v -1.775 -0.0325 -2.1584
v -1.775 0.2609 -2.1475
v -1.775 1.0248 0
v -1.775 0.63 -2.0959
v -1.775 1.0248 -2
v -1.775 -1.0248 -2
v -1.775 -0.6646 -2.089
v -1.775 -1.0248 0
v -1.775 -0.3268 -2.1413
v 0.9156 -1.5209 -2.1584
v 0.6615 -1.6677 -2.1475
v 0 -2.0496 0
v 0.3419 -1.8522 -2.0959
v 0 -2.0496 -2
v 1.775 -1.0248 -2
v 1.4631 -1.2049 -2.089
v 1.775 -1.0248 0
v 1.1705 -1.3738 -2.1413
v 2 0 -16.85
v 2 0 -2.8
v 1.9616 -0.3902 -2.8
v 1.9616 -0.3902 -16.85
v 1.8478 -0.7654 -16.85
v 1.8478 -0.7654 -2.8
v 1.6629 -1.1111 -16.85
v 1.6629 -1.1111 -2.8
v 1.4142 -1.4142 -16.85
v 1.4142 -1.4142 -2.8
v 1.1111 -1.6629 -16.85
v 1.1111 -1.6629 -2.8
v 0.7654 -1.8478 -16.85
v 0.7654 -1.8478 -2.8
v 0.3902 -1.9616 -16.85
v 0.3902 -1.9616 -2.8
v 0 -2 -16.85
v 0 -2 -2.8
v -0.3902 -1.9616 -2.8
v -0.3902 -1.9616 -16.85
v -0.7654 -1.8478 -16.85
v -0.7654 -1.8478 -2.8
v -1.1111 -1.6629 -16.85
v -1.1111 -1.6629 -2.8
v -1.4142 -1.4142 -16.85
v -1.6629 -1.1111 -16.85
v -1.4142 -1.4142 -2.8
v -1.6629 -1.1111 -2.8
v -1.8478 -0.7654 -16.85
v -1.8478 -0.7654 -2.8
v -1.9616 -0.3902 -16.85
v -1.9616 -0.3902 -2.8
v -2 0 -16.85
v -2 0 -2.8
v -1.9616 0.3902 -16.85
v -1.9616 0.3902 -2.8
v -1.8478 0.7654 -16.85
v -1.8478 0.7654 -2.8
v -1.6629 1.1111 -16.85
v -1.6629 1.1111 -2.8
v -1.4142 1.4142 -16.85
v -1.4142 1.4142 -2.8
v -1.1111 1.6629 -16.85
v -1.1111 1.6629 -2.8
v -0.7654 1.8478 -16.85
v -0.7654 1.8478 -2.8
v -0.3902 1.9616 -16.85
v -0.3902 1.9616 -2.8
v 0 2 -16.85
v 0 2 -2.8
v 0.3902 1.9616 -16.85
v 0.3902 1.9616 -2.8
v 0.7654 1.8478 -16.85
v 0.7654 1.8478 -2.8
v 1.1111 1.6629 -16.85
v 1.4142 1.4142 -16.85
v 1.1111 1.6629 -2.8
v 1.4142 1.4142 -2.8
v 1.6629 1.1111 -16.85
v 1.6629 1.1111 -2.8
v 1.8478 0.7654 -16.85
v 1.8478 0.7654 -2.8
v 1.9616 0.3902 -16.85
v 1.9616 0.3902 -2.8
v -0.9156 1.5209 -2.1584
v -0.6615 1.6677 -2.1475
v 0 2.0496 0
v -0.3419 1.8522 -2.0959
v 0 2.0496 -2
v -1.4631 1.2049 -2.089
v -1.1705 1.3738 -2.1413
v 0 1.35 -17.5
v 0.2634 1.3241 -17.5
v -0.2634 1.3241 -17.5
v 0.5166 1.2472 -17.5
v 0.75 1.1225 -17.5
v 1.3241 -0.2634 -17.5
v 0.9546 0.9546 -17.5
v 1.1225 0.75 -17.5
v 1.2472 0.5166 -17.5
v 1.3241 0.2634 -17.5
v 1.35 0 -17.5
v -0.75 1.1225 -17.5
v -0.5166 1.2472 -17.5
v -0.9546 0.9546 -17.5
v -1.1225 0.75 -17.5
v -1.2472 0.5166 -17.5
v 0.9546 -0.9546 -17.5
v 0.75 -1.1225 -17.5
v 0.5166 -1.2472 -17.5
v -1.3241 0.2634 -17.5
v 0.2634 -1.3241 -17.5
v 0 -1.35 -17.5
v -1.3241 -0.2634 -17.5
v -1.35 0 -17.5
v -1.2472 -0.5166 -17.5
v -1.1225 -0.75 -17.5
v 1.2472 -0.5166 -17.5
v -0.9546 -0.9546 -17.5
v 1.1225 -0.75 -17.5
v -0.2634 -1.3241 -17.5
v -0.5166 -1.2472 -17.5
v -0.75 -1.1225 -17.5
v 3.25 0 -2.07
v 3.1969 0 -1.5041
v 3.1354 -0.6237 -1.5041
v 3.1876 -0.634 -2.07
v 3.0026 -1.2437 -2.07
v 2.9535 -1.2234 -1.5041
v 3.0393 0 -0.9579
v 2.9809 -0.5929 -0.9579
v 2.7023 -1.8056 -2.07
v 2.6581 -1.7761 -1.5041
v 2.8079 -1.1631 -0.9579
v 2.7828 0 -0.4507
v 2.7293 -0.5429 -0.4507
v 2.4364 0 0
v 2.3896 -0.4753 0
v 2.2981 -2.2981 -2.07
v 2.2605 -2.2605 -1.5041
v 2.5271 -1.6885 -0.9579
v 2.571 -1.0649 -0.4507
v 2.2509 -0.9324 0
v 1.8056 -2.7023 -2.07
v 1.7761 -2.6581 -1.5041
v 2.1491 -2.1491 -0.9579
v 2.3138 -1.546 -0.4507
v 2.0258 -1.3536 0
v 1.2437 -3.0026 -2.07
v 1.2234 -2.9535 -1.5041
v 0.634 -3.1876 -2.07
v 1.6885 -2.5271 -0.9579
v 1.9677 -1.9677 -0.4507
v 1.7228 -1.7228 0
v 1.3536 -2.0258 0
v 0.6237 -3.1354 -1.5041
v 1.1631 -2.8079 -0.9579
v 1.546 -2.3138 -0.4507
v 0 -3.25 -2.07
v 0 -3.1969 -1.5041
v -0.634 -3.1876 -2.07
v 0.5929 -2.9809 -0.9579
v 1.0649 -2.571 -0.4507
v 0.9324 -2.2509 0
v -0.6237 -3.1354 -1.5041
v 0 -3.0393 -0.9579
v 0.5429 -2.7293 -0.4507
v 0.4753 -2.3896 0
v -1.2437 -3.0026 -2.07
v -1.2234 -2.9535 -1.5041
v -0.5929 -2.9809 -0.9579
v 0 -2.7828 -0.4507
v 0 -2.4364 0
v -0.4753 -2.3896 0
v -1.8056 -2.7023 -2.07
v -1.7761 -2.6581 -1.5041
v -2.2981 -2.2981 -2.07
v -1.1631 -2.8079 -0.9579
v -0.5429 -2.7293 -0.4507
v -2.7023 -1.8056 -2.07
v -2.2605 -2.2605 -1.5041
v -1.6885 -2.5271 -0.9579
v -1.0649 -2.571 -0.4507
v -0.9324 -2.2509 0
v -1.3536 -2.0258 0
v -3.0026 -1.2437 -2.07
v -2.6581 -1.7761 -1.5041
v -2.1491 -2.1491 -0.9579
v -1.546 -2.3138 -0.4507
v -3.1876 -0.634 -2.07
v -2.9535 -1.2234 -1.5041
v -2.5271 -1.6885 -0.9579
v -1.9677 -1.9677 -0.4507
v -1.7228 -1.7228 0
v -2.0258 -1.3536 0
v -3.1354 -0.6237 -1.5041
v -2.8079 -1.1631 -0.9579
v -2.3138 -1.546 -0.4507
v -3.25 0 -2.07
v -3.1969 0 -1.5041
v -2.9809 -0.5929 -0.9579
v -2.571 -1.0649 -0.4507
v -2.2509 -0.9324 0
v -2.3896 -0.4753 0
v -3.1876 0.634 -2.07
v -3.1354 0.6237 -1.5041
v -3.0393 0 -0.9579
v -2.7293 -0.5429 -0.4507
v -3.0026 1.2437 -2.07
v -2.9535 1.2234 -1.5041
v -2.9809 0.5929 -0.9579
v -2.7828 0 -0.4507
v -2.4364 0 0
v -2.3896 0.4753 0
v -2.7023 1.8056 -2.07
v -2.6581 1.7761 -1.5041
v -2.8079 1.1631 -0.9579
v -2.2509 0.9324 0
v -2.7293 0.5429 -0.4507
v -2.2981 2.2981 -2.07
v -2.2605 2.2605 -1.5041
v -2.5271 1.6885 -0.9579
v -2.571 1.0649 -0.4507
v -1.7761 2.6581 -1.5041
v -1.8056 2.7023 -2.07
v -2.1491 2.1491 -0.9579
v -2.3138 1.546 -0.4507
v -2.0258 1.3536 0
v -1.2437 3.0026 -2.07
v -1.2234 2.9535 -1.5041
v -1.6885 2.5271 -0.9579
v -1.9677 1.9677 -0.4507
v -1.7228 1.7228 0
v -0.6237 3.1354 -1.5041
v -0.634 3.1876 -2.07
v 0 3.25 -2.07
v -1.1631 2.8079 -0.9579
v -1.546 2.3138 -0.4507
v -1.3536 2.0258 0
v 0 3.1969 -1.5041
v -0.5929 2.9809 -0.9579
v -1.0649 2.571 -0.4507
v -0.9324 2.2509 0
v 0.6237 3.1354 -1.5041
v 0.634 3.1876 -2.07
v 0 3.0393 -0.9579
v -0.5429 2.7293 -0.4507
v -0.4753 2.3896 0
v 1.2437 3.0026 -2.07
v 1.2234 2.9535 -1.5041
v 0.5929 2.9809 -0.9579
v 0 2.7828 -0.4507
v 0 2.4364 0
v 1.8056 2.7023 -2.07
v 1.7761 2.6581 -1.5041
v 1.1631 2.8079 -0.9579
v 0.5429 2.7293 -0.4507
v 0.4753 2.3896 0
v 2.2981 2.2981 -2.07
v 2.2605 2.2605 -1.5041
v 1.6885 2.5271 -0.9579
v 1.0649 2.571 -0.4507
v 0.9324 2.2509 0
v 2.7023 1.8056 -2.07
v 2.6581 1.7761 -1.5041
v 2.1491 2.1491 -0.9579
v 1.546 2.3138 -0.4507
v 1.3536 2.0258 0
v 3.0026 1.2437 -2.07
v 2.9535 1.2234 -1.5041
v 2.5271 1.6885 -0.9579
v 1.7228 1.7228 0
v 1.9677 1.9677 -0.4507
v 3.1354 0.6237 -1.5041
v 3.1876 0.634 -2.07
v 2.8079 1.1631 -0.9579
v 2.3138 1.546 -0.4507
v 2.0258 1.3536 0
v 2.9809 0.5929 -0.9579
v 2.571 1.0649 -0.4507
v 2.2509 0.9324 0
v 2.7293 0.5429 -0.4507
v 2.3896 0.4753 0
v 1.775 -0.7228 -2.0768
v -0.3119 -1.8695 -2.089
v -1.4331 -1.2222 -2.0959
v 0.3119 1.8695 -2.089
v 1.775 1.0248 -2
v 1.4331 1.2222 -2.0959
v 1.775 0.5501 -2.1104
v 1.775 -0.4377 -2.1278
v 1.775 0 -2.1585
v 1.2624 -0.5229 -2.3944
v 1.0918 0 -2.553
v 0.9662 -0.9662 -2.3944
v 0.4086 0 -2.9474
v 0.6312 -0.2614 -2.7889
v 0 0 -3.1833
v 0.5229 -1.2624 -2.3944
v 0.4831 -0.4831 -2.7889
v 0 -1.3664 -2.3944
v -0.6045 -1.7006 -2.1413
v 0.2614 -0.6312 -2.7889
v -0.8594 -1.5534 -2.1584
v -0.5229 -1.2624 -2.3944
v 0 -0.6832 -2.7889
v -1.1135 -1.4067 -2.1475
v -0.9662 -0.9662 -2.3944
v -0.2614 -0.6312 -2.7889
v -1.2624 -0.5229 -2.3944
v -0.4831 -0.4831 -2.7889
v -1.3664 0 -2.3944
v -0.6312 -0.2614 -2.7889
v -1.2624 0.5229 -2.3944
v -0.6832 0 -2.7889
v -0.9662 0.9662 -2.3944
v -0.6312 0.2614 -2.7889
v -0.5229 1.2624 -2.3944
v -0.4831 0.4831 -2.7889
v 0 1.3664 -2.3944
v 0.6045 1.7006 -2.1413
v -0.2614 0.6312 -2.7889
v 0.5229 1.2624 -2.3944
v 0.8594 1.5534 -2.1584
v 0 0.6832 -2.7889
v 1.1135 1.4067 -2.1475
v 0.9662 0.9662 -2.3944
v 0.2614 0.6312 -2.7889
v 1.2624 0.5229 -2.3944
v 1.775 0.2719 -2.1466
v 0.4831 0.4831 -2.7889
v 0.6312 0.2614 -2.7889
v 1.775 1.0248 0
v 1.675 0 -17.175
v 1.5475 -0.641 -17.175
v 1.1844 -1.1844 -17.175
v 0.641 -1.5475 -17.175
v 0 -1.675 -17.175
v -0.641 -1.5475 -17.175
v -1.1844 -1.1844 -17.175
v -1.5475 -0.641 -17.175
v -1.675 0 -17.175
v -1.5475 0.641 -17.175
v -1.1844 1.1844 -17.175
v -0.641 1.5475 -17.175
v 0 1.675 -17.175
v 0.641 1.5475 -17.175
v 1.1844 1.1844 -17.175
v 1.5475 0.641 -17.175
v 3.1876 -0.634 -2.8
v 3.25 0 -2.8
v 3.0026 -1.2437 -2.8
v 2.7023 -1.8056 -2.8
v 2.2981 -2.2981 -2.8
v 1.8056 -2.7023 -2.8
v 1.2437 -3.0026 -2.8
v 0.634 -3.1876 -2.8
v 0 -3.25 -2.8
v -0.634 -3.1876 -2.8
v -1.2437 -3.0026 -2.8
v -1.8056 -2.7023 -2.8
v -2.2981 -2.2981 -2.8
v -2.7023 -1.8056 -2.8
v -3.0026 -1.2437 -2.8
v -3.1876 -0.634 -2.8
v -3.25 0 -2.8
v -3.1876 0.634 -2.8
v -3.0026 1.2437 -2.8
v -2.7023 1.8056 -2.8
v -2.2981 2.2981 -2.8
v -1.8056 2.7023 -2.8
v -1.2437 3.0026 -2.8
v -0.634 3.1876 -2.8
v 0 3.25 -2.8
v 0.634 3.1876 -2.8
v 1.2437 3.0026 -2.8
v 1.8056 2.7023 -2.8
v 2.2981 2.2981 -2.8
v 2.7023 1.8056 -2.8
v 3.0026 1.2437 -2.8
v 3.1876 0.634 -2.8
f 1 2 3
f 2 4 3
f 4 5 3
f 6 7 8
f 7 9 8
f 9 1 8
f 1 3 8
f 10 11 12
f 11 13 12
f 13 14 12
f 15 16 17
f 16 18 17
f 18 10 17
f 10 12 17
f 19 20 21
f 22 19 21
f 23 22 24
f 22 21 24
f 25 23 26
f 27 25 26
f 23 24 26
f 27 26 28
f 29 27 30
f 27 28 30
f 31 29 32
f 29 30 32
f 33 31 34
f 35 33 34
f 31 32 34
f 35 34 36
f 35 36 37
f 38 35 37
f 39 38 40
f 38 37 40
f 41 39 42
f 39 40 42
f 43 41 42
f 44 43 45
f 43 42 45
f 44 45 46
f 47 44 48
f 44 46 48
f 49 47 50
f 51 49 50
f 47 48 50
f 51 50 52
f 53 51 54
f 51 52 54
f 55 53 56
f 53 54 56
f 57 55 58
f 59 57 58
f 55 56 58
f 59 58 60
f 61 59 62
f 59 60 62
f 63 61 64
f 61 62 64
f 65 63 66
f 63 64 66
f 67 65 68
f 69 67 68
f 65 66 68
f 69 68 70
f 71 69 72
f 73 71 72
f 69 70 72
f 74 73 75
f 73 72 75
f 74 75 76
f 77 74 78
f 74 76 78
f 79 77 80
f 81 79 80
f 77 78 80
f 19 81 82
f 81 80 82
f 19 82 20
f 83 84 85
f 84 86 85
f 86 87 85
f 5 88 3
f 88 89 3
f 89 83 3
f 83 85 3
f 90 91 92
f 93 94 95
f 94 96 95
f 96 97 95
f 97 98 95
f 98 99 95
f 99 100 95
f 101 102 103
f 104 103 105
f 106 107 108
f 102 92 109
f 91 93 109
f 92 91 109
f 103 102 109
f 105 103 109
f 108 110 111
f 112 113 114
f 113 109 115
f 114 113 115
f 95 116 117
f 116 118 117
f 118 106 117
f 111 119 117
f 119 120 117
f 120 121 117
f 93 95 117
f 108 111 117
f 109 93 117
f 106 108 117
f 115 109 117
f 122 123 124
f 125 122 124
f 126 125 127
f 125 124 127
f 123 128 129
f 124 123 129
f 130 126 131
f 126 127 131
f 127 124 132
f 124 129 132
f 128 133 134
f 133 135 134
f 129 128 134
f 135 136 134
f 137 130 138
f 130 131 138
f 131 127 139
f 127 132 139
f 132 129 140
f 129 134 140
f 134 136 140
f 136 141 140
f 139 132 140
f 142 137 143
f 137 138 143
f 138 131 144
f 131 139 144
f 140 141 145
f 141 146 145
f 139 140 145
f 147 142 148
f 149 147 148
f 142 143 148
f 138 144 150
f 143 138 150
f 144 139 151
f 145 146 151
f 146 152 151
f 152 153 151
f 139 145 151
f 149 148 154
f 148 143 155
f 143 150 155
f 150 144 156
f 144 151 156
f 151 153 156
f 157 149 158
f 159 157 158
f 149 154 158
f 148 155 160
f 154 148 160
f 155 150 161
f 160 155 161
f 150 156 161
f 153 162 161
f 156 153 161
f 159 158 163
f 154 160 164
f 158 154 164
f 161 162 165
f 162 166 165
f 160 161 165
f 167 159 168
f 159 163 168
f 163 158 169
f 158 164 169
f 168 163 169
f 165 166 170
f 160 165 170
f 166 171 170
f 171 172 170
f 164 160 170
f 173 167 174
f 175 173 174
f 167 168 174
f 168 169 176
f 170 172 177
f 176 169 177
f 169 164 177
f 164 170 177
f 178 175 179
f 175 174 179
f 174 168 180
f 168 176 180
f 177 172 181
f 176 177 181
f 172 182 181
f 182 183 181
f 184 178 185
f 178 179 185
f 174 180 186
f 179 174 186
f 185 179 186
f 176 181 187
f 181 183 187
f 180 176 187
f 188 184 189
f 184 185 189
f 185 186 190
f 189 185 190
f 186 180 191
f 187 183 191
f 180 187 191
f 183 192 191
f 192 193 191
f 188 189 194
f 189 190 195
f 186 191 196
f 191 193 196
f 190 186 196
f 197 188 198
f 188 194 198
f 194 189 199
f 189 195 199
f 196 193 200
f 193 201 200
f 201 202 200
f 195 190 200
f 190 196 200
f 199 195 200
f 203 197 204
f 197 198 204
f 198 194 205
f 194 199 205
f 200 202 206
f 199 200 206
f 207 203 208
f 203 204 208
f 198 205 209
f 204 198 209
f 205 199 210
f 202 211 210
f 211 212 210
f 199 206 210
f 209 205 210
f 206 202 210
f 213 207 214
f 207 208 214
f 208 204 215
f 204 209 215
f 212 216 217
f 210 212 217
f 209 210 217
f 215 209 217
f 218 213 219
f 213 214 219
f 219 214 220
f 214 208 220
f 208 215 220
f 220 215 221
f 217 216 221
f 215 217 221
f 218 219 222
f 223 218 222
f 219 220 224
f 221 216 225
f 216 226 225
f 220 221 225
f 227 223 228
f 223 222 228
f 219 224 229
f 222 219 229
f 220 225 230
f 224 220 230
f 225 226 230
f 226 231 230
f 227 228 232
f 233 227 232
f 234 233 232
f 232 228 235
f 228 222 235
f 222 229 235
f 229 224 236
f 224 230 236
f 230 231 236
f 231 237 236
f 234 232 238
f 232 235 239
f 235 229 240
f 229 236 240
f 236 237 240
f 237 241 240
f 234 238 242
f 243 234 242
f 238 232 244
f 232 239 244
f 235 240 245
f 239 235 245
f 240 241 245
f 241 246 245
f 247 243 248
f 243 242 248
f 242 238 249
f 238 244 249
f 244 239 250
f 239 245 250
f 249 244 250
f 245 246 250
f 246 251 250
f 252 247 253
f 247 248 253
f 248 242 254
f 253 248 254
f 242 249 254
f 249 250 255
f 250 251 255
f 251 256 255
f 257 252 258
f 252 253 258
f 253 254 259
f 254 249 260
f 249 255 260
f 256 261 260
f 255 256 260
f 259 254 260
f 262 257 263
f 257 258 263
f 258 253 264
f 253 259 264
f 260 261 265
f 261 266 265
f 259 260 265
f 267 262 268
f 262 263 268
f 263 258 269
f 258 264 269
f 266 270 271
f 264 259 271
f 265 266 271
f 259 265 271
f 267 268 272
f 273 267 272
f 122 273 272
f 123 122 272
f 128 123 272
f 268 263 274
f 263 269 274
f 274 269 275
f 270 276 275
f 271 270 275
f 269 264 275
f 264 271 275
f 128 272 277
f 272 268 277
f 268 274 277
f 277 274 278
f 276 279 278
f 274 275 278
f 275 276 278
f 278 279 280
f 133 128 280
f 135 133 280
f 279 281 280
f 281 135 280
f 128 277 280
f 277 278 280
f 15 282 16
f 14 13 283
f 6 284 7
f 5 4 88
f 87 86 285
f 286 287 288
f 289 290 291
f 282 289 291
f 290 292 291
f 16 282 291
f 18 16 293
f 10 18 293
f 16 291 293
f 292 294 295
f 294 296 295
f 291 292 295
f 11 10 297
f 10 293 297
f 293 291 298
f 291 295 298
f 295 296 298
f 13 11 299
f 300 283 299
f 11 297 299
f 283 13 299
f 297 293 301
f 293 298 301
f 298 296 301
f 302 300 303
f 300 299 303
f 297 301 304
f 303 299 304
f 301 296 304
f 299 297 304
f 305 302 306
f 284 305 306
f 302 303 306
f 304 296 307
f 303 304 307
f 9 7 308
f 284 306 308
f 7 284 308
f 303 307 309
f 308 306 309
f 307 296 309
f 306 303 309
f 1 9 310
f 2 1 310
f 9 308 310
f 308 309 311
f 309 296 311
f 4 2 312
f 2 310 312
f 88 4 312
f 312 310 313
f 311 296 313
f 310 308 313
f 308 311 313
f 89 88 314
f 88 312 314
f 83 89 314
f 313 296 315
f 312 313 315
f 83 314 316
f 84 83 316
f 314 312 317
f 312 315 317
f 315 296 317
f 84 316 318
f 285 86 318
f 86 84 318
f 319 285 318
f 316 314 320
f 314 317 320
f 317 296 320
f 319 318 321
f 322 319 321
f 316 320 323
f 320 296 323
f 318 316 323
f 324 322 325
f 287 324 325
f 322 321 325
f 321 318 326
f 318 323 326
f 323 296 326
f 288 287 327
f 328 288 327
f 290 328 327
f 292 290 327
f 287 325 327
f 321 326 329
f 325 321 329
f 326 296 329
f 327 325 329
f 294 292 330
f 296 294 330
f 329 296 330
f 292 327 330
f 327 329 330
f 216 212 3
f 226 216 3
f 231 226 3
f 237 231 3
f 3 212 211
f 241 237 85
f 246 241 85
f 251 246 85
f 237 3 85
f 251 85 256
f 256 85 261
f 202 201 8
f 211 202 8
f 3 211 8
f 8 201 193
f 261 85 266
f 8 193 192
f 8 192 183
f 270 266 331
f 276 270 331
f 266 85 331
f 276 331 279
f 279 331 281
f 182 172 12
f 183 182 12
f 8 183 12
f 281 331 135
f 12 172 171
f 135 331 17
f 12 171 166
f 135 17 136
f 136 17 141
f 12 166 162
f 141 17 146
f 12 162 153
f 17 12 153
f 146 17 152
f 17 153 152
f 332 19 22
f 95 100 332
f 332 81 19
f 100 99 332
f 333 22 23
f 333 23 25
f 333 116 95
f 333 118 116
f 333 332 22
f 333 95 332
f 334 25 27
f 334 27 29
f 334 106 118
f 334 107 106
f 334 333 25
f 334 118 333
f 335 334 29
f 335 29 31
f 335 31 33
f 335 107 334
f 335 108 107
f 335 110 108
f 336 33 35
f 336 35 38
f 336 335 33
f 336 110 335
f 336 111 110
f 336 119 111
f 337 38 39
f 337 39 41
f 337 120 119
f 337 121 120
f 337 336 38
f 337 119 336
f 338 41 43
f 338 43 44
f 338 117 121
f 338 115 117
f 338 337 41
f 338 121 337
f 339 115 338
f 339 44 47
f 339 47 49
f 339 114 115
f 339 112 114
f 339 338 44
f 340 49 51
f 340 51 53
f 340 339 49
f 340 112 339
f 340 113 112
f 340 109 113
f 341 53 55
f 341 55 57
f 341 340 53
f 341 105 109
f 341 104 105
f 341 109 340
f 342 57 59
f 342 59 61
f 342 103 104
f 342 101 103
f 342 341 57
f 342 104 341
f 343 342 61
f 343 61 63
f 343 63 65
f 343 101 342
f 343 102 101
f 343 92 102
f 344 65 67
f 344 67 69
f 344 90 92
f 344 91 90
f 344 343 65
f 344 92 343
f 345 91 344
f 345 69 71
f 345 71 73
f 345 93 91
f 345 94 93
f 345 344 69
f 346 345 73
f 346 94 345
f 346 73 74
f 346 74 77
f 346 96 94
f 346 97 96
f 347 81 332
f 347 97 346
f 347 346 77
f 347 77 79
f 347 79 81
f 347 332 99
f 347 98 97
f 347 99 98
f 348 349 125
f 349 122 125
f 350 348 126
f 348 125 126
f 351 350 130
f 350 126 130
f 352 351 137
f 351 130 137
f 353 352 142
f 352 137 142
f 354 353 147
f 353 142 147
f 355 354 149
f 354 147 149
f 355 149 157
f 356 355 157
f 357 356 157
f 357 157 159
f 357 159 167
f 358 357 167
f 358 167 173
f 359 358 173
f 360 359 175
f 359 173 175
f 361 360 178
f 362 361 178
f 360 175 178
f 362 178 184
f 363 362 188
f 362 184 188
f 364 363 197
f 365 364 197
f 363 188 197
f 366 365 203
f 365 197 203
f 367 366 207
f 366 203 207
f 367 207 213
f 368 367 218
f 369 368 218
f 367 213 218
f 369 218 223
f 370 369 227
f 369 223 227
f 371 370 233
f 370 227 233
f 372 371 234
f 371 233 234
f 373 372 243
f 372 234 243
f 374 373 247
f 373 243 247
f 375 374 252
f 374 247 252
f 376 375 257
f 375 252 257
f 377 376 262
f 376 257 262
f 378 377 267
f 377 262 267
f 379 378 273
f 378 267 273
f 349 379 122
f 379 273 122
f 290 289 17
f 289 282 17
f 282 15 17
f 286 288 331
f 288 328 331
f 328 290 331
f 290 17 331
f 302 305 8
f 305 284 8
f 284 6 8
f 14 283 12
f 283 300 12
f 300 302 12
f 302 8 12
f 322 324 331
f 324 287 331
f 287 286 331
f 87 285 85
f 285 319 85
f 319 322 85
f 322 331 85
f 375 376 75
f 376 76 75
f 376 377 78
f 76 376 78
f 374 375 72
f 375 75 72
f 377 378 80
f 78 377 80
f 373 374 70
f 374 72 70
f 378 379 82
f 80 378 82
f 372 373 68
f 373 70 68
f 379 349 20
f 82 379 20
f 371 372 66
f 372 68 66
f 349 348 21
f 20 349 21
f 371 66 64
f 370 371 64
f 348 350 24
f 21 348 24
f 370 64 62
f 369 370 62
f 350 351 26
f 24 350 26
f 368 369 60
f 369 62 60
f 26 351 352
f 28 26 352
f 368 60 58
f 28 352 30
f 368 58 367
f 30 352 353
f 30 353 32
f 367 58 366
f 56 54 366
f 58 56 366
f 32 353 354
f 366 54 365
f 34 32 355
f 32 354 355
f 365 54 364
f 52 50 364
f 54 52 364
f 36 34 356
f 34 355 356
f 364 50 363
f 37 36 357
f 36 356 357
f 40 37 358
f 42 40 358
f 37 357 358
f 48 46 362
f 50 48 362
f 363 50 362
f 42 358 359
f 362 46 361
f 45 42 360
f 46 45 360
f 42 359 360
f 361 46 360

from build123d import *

# Parameters (mm, degrees)
CHANFREIN2_SIZE    = 0.65
BOSS_EXTRU_1_REACH = 20.094
ESQUISSE3_R        = 2.43636475


with BuildPart() as part:
    # Esquisse1 → Révolution1 (revolve)
    with BuildSketch(Plane(origin=(0, 0, 0), x_dir=(0, 0, -1), z_dir=(1, 0, 0)), mode=Mode.PRIVATE) as r_volution1_sk:
        with BuildLine():
            Line((17.5, 2), (2.8, 2))
            Line((2.8, 2), (2.8, 3.25))
            Line((2.8, 3.25), (2.07, 3.25))
            ThreePointArc((2.07, 3.25), (0.957918357, 3.039288677), (0, 2.43636475))
            Line((0, 2.43636475), (0, 0))
            Line((0, 0), (17.5, 0))
            Line((17.5, 0), (17.5, 2))
        make_face()
    revolve(r_volution1_sk.sketch.rotate(Axis((0, 0, -17.5), (0, 0, -1)), 90), axis=Axis((0, 0, -17.5), (0, 0, -1)))

    # Chanfrein2
    chanfrein2_edges = [part.edges().sort_by_distance(p)[0] for p in [
        (-2, 0, -17.5),
    ]]
    chamfer(chanfrein2_edges, length=CHANFREIN2_SIZE)

    # Esquisse2 → Enlèvement de matière-Révolution1 (revolve, cut)
    with BuildSketch(Plane(origin=(0, 0, 0), x_dir=(0, 0, -1), z_dir=(1, 0, 0)), mode=Mode.PRIVATE) as enl_vement_de_mati_re_r_volution1_sk:
        Polygon((0, 0), (0, 2.049593456), (2, 2.049593456), (3.183333333, 0), align=None)
    revolve(enl_vement_de_mati_re_r_volution1_sk.sketch.rotate(Axis((0, 0, 0), (0, 0, -1)), 90), axis=Axis((0, 0, 0), (0, 0, -1)), mode=Mode.SUBTRACT)

    # Boss.-Extru.1: up to this cone (the profile starts inside it)
    boss_extru_1_end = Plane(origin=(0, 0, 0), z_dir=(0, 0, 1)).offset(-3.183332333) * Cone(1.732e-06, 50.733549402, 29.291027404, align=(Align.CENTER, Align.CENTER, Align.MIN), mode=Mode.PRIVATE)
    # Esquisse3 → Boss.-Extru.1 (add, up to the surface)
    with BuildSketch(Plane.XY, mode=Mode.PRIVATE) as boss_extru_1_sk1:
        Circle(ESQUISSE3_R)
        Polygon((0, 2.049593456), (-1.775, 1.024796728), (-1.775, -1.024796728), (0, -2.049593456), (1.775, -1.024796728), (1.775, 1.024796728), align=None, mode=Mode.SUBTRACT)
    boss_extru_1_tool1 = extrude(boss_extru_1_sk1.sketch, amount=-BOSS_EXTRU_1_REACH, mode=Mode.PRIVATE) & boss_extru_1_end
    add(boss_extru_1_tool1.solids().sort_by_distance((-2.367454, 0, 0))[0])


solid = part.part
